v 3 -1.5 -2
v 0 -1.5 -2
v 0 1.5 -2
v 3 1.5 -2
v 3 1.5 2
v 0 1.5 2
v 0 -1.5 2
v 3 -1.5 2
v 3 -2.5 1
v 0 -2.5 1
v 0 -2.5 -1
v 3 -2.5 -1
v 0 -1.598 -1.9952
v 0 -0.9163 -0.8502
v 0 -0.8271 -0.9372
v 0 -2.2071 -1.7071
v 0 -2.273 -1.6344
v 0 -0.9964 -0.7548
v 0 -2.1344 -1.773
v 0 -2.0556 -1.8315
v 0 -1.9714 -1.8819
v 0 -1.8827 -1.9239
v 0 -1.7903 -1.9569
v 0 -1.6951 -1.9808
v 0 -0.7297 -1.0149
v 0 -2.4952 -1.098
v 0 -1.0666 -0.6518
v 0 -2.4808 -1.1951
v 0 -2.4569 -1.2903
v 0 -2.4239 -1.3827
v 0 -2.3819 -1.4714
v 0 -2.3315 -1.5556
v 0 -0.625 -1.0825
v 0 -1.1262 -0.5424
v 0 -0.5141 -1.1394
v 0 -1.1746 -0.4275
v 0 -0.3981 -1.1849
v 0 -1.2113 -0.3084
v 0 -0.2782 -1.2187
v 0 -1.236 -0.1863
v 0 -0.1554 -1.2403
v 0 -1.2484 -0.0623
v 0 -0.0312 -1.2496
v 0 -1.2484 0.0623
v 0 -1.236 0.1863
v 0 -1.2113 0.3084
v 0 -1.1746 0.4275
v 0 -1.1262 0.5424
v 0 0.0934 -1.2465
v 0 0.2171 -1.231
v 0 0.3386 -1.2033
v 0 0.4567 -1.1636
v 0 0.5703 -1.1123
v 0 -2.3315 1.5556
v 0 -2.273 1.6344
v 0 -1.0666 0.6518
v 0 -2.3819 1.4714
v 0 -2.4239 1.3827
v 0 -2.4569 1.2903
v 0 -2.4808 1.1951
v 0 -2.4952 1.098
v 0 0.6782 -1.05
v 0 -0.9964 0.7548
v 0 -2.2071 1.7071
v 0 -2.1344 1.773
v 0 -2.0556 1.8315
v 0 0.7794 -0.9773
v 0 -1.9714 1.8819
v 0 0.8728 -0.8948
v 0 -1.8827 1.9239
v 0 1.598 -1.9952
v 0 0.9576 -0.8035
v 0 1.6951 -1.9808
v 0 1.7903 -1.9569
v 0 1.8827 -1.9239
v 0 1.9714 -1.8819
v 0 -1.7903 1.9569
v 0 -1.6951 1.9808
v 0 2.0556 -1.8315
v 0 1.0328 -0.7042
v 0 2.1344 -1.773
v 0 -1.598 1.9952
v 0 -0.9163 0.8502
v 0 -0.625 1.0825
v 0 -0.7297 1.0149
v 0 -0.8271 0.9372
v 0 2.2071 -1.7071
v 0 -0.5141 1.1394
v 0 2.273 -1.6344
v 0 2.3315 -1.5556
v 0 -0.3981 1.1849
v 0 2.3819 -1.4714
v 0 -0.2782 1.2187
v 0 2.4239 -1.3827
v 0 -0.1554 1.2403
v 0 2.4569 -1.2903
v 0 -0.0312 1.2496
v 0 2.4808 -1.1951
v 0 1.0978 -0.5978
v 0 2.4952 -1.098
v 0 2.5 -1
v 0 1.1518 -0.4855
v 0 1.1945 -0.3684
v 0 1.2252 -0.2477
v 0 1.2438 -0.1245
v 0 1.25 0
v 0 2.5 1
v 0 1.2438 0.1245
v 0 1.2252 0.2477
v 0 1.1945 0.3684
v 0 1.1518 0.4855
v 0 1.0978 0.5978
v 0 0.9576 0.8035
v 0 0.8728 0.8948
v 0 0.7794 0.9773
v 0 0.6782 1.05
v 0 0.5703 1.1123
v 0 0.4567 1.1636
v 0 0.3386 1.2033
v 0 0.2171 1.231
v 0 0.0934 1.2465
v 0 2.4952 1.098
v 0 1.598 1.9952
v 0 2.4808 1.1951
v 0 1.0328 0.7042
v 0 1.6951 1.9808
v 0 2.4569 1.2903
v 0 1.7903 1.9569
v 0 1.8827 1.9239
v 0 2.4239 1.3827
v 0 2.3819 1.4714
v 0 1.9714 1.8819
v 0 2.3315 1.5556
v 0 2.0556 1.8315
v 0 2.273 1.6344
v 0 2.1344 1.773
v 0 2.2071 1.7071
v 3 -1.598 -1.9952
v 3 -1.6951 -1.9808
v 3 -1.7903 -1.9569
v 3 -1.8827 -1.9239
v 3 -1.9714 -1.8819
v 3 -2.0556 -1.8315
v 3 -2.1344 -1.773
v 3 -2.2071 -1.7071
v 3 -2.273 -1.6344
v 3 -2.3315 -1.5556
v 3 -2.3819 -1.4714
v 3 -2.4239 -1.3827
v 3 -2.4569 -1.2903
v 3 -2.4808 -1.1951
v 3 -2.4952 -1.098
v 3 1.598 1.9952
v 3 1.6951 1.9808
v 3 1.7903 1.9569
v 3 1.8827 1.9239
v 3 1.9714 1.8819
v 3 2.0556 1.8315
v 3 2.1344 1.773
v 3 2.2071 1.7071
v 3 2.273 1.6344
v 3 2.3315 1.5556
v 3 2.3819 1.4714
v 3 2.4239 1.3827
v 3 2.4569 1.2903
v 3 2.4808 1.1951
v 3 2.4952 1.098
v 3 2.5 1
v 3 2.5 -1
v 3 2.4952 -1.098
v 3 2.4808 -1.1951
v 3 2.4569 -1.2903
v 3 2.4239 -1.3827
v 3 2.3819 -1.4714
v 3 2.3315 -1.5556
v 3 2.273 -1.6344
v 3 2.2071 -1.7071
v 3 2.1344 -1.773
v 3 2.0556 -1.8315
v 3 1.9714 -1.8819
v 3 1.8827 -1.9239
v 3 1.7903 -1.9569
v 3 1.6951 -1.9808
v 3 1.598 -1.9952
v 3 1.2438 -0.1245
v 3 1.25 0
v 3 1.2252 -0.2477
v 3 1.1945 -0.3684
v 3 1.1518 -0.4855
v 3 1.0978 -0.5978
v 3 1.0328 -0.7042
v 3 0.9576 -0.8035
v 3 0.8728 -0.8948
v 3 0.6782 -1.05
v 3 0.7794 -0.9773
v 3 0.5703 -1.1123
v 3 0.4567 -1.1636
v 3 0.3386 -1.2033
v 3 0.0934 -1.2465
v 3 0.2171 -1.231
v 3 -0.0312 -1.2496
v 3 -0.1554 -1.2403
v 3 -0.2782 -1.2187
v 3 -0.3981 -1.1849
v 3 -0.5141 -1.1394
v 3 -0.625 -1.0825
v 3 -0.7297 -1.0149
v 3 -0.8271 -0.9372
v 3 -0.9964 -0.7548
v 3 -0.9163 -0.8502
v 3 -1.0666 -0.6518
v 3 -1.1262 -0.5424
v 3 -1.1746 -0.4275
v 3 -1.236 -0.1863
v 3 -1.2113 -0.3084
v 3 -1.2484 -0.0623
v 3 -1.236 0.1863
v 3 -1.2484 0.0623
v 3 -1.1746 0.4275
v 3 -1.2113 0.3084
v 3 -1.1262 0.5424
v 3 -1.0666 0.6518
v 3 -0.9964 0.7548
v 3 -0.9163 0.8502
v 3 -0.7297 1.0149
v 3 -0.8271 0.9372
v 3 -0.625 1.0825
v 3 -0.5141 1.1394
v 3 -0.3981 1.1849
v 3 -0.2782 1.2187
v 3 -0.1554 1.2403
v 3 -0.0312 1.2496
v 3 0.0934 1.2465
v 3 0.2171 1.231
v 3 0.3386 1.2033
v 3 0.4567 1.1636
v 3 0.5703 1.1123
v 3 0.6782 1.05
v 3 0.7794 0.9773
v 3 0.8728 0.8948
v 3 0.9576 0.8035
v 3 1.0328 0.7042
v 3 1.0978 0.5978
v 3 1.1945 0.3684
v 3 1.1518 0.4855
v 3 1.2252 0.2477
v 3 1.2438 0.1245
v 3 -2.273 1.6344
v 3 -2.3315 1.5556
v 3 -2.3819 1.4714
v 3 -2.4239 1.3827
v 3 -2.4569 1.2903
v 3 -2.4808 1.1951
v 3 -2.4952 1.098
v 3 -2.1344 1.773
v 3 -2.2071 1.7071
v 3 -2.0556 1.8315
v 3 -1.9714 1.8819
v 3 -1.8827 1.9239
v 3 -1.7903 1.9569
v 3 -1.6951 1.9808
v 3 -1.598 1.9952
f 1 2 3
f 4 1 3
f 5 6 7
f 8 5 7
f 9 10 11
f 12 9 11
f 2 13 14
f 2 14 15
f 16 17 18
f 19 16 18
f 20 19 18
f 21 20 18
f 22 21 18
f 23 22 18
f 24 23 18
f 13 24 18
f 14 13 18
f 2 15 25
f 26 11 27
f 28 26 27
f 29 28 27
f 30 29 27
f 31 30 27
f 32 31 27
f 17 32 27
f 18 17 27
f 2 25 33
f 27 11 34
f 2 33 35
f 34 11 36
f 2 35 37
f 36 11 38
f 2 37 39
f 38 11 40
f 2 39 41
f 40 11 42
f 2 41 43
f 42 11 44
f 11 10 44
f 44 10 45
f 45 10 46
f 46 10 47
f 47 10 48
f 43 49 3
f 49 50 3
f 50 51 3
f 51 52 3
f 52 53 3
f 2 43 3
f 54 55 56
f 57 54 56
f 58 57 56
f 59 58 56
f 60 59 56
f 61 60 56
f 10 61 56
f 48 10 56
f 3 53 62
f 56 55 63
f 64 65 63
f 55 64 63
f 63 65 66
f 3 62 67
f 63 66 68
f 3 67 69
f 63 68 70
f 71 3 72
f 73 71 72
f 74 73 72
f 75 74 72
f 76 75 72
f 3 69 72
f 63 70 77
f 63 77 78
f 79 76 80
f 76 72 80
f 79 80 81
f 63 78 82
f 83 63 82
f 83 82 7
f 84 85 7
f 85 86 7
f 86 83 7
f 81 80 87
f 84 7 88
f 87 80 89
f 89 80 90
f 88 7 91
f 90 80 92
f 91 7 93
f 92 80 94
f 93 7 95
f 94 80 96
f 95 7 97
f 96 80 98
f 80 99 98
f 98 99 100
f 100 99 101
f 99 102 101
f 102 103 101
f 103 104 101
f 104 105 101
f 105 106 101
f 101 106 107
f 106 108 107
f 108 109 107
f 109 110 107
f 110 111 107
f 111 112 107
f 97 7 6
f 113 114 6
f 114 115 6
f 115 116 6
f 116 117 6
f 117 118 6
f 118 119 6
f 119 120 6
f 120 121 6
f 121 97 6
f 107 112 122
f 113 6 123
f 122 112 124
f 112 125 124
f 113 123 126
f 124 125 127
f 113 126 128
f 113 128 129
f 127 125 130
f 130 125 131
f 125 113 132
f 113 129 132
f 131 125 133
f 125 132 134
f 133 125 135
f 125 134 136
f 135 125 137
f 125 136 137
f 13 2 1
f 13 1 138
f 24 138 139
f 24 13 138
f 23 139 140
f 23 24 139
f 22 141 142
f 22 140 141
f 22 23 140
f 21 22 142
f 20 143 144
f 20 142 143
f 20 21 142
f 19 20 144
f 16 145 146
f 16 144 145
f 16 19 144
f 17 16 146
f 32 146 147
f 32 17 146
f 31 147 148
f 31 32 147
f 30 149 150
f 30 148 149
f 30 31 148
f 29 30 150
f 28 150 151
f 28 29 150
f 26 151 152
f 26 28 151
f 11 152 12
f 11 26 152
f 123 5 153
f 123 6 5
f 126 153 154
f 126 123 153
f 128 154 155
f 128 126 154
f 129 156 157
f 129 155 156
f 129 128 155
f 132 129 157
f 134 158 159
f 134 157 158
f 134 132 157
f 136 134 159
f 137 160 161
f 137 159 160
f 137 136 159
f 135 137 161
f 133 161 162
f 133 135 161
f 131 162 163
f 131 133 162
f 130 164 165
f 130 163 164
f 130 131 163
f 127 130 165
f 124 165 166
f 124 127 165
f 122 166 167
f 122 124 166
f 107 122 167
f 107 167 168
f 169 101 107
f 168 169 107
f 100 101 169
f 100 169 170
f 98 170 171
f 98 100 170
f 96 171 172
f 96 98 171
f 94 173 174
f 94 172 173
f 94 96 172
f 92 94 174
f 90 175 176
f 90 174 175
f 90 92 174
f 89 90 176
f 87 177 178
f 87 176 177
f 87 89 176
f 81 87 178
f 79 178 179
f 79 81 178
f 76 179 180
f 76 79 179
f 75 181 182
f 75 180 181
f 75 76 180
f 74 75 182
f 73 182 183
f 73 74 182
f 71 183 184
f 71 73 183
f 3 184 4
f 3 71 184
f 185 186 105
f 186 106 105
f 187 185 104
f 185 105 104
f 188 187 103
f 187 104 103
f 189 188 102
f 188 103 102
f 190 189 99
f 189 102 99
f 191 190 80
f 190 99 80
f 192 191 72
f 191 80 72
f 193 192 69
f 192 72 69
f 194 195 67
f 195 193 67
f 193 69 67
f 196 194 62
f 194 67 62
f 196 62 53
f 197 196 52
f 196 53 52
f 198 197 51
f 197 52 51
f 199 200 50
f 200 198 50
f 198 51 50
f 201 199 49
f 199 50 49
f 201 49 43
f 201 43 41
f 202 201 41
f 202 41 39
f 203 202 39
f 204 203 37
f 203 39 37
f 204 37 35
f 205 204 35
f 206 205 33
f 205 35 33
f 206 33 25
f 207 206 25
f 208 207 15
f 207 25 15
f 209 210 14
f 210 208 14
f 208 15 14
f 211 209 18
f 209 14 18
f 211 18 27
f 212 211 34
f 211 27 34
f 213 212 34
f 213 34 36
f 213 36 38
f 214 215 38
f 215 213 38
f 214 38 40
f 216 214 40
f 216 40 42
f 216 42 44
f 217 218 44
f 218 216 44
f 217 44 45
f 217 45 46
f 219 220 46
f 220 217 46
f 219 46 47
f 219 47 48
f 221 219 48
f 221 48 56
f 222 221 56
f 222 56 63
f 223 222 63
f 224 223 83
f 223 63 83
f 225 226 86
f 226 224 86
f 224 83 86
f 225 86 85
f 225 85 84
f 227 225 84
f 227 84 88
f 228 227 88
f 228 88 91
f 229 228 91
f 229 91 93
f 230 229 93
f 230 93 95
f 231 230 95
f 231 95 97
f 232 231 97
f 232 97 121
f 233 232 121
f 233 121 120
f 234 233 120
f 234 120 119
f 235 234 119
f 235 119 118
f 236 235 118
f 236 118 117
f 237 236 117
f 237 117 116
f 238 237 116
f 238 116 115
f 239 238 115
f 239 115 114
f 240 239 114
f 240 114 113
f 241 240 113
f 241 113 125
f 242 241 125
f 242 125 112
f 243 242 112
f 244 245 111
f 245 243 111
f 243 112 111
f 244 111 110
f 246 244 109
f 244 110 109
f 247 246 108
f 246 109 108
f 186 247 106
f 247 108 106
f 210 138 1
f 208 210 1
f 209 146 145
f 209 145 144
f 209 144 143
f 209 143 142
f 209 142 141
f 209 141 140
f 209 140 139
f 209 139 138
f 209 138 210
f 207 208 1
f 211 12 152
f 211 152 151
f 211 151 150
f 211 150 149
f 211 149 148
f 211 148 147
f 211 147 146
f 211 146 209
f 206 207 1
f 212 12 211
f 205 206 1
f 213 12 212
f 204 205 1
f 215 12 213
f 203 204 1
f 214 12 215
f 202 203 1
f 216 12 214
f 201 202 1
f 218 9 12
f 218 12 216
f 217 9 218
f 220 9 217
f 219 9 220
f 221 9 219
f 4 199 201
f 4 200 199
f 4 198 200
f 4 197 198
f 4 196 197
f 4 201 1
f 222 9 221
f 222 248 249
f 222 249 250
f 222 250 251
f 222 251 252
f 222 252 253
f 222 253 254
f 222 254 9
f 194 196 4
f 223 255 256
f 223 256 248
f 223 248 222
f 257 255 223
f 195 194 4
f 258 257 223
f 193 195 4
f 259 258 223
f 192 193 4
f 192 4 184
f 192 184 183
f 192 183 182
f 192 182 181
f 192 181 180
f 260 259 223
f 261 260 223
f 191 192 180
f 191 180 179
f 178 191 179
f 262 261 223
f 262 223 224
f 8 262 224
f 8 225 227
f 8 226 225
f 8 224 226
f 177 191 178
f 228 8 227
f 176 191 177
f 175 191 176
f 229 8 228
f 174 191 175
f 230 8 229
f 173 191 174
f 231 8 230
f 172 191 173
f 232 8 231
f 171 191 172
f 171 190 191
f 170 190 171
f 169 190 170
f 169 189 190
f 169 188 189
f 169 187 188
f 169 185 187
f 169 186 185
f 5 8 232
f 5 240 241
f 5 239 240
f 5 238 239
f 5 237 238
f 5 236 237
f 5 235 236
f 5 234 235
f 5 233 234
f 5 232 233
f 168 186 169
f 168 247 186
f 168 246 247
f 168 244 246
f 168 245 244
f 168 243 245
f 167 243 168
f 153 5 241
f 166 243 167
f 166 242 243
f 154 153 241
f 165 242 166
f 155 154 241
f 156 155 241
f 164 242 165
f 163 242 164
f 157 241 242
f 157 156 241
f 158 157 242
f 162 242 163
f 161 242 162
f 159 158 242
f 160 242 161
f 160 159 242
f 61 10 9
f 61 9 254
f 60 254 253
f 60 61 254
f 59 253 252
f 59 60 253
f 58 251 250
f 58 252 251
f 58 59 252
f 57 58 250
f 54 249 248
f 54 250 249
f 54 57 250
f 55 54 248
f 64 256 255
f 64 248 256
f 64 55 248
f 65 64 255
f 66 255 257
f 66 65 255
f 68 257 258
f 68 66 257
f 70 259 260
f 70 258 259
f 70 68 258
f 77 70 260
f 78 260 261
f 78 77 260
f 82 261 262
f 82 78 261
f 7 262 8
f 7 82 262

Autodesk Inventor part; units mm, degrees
ref_plane "YZ Plane" through (0, 0, 0) normal (1, 0, 0) x (0, 1, 0)
ref_plane "XZ Plane" through (0, 0, 0) normal (0, 1, 0) x (-1, 0, 0)
ref_plane "XY Plane" through (0, 0, 0) normal (0, 0, 1) x (1, 0, 0)
sketch "Sketch1" plane through (0, 0, 0) normal (1, 0, 0) x (0, 1, 0)
  line L0 (1.5, 2) -> (-1.5, 2)
  line L1 (-2.5, 1) -> (-2.5, -1)
  line L2 (-1.5, -2) -> (1.5, -2)
  line L3 (2.5, -1) -> (2.5, 1)
  circle A0 centre (0, 0) radius 1.25
  arc A1 (2.5, 1) -> (1.5, 2) centre (1.5, 1) ccw
  arc A2 (1.5, -2) -> (2.5, -1) centre (1.5, -1) ccw
  arc A3 (-1.5, 2) -> (-2.5, 1) centre (-1.5, 1) ccw
  arc A4 (-2.5, -1) -> (-1.5, -2) centre (-1.5, -1) ccw
  point P0 (2.5, 2)
  point P1 (-2.5, 2)
  point P2 (2.5, -2)
  point P3 (2.5, 0)
  point P4 (0, 2)
  dimension "d0" = 4
  dimension "d1" = 5
  dimension "d2" = 2.5
  dimension "d3" = 1
extrude "Extrusion1" add sketch "Sketch1" along normal blind 3
properties part number "Podkladka"
